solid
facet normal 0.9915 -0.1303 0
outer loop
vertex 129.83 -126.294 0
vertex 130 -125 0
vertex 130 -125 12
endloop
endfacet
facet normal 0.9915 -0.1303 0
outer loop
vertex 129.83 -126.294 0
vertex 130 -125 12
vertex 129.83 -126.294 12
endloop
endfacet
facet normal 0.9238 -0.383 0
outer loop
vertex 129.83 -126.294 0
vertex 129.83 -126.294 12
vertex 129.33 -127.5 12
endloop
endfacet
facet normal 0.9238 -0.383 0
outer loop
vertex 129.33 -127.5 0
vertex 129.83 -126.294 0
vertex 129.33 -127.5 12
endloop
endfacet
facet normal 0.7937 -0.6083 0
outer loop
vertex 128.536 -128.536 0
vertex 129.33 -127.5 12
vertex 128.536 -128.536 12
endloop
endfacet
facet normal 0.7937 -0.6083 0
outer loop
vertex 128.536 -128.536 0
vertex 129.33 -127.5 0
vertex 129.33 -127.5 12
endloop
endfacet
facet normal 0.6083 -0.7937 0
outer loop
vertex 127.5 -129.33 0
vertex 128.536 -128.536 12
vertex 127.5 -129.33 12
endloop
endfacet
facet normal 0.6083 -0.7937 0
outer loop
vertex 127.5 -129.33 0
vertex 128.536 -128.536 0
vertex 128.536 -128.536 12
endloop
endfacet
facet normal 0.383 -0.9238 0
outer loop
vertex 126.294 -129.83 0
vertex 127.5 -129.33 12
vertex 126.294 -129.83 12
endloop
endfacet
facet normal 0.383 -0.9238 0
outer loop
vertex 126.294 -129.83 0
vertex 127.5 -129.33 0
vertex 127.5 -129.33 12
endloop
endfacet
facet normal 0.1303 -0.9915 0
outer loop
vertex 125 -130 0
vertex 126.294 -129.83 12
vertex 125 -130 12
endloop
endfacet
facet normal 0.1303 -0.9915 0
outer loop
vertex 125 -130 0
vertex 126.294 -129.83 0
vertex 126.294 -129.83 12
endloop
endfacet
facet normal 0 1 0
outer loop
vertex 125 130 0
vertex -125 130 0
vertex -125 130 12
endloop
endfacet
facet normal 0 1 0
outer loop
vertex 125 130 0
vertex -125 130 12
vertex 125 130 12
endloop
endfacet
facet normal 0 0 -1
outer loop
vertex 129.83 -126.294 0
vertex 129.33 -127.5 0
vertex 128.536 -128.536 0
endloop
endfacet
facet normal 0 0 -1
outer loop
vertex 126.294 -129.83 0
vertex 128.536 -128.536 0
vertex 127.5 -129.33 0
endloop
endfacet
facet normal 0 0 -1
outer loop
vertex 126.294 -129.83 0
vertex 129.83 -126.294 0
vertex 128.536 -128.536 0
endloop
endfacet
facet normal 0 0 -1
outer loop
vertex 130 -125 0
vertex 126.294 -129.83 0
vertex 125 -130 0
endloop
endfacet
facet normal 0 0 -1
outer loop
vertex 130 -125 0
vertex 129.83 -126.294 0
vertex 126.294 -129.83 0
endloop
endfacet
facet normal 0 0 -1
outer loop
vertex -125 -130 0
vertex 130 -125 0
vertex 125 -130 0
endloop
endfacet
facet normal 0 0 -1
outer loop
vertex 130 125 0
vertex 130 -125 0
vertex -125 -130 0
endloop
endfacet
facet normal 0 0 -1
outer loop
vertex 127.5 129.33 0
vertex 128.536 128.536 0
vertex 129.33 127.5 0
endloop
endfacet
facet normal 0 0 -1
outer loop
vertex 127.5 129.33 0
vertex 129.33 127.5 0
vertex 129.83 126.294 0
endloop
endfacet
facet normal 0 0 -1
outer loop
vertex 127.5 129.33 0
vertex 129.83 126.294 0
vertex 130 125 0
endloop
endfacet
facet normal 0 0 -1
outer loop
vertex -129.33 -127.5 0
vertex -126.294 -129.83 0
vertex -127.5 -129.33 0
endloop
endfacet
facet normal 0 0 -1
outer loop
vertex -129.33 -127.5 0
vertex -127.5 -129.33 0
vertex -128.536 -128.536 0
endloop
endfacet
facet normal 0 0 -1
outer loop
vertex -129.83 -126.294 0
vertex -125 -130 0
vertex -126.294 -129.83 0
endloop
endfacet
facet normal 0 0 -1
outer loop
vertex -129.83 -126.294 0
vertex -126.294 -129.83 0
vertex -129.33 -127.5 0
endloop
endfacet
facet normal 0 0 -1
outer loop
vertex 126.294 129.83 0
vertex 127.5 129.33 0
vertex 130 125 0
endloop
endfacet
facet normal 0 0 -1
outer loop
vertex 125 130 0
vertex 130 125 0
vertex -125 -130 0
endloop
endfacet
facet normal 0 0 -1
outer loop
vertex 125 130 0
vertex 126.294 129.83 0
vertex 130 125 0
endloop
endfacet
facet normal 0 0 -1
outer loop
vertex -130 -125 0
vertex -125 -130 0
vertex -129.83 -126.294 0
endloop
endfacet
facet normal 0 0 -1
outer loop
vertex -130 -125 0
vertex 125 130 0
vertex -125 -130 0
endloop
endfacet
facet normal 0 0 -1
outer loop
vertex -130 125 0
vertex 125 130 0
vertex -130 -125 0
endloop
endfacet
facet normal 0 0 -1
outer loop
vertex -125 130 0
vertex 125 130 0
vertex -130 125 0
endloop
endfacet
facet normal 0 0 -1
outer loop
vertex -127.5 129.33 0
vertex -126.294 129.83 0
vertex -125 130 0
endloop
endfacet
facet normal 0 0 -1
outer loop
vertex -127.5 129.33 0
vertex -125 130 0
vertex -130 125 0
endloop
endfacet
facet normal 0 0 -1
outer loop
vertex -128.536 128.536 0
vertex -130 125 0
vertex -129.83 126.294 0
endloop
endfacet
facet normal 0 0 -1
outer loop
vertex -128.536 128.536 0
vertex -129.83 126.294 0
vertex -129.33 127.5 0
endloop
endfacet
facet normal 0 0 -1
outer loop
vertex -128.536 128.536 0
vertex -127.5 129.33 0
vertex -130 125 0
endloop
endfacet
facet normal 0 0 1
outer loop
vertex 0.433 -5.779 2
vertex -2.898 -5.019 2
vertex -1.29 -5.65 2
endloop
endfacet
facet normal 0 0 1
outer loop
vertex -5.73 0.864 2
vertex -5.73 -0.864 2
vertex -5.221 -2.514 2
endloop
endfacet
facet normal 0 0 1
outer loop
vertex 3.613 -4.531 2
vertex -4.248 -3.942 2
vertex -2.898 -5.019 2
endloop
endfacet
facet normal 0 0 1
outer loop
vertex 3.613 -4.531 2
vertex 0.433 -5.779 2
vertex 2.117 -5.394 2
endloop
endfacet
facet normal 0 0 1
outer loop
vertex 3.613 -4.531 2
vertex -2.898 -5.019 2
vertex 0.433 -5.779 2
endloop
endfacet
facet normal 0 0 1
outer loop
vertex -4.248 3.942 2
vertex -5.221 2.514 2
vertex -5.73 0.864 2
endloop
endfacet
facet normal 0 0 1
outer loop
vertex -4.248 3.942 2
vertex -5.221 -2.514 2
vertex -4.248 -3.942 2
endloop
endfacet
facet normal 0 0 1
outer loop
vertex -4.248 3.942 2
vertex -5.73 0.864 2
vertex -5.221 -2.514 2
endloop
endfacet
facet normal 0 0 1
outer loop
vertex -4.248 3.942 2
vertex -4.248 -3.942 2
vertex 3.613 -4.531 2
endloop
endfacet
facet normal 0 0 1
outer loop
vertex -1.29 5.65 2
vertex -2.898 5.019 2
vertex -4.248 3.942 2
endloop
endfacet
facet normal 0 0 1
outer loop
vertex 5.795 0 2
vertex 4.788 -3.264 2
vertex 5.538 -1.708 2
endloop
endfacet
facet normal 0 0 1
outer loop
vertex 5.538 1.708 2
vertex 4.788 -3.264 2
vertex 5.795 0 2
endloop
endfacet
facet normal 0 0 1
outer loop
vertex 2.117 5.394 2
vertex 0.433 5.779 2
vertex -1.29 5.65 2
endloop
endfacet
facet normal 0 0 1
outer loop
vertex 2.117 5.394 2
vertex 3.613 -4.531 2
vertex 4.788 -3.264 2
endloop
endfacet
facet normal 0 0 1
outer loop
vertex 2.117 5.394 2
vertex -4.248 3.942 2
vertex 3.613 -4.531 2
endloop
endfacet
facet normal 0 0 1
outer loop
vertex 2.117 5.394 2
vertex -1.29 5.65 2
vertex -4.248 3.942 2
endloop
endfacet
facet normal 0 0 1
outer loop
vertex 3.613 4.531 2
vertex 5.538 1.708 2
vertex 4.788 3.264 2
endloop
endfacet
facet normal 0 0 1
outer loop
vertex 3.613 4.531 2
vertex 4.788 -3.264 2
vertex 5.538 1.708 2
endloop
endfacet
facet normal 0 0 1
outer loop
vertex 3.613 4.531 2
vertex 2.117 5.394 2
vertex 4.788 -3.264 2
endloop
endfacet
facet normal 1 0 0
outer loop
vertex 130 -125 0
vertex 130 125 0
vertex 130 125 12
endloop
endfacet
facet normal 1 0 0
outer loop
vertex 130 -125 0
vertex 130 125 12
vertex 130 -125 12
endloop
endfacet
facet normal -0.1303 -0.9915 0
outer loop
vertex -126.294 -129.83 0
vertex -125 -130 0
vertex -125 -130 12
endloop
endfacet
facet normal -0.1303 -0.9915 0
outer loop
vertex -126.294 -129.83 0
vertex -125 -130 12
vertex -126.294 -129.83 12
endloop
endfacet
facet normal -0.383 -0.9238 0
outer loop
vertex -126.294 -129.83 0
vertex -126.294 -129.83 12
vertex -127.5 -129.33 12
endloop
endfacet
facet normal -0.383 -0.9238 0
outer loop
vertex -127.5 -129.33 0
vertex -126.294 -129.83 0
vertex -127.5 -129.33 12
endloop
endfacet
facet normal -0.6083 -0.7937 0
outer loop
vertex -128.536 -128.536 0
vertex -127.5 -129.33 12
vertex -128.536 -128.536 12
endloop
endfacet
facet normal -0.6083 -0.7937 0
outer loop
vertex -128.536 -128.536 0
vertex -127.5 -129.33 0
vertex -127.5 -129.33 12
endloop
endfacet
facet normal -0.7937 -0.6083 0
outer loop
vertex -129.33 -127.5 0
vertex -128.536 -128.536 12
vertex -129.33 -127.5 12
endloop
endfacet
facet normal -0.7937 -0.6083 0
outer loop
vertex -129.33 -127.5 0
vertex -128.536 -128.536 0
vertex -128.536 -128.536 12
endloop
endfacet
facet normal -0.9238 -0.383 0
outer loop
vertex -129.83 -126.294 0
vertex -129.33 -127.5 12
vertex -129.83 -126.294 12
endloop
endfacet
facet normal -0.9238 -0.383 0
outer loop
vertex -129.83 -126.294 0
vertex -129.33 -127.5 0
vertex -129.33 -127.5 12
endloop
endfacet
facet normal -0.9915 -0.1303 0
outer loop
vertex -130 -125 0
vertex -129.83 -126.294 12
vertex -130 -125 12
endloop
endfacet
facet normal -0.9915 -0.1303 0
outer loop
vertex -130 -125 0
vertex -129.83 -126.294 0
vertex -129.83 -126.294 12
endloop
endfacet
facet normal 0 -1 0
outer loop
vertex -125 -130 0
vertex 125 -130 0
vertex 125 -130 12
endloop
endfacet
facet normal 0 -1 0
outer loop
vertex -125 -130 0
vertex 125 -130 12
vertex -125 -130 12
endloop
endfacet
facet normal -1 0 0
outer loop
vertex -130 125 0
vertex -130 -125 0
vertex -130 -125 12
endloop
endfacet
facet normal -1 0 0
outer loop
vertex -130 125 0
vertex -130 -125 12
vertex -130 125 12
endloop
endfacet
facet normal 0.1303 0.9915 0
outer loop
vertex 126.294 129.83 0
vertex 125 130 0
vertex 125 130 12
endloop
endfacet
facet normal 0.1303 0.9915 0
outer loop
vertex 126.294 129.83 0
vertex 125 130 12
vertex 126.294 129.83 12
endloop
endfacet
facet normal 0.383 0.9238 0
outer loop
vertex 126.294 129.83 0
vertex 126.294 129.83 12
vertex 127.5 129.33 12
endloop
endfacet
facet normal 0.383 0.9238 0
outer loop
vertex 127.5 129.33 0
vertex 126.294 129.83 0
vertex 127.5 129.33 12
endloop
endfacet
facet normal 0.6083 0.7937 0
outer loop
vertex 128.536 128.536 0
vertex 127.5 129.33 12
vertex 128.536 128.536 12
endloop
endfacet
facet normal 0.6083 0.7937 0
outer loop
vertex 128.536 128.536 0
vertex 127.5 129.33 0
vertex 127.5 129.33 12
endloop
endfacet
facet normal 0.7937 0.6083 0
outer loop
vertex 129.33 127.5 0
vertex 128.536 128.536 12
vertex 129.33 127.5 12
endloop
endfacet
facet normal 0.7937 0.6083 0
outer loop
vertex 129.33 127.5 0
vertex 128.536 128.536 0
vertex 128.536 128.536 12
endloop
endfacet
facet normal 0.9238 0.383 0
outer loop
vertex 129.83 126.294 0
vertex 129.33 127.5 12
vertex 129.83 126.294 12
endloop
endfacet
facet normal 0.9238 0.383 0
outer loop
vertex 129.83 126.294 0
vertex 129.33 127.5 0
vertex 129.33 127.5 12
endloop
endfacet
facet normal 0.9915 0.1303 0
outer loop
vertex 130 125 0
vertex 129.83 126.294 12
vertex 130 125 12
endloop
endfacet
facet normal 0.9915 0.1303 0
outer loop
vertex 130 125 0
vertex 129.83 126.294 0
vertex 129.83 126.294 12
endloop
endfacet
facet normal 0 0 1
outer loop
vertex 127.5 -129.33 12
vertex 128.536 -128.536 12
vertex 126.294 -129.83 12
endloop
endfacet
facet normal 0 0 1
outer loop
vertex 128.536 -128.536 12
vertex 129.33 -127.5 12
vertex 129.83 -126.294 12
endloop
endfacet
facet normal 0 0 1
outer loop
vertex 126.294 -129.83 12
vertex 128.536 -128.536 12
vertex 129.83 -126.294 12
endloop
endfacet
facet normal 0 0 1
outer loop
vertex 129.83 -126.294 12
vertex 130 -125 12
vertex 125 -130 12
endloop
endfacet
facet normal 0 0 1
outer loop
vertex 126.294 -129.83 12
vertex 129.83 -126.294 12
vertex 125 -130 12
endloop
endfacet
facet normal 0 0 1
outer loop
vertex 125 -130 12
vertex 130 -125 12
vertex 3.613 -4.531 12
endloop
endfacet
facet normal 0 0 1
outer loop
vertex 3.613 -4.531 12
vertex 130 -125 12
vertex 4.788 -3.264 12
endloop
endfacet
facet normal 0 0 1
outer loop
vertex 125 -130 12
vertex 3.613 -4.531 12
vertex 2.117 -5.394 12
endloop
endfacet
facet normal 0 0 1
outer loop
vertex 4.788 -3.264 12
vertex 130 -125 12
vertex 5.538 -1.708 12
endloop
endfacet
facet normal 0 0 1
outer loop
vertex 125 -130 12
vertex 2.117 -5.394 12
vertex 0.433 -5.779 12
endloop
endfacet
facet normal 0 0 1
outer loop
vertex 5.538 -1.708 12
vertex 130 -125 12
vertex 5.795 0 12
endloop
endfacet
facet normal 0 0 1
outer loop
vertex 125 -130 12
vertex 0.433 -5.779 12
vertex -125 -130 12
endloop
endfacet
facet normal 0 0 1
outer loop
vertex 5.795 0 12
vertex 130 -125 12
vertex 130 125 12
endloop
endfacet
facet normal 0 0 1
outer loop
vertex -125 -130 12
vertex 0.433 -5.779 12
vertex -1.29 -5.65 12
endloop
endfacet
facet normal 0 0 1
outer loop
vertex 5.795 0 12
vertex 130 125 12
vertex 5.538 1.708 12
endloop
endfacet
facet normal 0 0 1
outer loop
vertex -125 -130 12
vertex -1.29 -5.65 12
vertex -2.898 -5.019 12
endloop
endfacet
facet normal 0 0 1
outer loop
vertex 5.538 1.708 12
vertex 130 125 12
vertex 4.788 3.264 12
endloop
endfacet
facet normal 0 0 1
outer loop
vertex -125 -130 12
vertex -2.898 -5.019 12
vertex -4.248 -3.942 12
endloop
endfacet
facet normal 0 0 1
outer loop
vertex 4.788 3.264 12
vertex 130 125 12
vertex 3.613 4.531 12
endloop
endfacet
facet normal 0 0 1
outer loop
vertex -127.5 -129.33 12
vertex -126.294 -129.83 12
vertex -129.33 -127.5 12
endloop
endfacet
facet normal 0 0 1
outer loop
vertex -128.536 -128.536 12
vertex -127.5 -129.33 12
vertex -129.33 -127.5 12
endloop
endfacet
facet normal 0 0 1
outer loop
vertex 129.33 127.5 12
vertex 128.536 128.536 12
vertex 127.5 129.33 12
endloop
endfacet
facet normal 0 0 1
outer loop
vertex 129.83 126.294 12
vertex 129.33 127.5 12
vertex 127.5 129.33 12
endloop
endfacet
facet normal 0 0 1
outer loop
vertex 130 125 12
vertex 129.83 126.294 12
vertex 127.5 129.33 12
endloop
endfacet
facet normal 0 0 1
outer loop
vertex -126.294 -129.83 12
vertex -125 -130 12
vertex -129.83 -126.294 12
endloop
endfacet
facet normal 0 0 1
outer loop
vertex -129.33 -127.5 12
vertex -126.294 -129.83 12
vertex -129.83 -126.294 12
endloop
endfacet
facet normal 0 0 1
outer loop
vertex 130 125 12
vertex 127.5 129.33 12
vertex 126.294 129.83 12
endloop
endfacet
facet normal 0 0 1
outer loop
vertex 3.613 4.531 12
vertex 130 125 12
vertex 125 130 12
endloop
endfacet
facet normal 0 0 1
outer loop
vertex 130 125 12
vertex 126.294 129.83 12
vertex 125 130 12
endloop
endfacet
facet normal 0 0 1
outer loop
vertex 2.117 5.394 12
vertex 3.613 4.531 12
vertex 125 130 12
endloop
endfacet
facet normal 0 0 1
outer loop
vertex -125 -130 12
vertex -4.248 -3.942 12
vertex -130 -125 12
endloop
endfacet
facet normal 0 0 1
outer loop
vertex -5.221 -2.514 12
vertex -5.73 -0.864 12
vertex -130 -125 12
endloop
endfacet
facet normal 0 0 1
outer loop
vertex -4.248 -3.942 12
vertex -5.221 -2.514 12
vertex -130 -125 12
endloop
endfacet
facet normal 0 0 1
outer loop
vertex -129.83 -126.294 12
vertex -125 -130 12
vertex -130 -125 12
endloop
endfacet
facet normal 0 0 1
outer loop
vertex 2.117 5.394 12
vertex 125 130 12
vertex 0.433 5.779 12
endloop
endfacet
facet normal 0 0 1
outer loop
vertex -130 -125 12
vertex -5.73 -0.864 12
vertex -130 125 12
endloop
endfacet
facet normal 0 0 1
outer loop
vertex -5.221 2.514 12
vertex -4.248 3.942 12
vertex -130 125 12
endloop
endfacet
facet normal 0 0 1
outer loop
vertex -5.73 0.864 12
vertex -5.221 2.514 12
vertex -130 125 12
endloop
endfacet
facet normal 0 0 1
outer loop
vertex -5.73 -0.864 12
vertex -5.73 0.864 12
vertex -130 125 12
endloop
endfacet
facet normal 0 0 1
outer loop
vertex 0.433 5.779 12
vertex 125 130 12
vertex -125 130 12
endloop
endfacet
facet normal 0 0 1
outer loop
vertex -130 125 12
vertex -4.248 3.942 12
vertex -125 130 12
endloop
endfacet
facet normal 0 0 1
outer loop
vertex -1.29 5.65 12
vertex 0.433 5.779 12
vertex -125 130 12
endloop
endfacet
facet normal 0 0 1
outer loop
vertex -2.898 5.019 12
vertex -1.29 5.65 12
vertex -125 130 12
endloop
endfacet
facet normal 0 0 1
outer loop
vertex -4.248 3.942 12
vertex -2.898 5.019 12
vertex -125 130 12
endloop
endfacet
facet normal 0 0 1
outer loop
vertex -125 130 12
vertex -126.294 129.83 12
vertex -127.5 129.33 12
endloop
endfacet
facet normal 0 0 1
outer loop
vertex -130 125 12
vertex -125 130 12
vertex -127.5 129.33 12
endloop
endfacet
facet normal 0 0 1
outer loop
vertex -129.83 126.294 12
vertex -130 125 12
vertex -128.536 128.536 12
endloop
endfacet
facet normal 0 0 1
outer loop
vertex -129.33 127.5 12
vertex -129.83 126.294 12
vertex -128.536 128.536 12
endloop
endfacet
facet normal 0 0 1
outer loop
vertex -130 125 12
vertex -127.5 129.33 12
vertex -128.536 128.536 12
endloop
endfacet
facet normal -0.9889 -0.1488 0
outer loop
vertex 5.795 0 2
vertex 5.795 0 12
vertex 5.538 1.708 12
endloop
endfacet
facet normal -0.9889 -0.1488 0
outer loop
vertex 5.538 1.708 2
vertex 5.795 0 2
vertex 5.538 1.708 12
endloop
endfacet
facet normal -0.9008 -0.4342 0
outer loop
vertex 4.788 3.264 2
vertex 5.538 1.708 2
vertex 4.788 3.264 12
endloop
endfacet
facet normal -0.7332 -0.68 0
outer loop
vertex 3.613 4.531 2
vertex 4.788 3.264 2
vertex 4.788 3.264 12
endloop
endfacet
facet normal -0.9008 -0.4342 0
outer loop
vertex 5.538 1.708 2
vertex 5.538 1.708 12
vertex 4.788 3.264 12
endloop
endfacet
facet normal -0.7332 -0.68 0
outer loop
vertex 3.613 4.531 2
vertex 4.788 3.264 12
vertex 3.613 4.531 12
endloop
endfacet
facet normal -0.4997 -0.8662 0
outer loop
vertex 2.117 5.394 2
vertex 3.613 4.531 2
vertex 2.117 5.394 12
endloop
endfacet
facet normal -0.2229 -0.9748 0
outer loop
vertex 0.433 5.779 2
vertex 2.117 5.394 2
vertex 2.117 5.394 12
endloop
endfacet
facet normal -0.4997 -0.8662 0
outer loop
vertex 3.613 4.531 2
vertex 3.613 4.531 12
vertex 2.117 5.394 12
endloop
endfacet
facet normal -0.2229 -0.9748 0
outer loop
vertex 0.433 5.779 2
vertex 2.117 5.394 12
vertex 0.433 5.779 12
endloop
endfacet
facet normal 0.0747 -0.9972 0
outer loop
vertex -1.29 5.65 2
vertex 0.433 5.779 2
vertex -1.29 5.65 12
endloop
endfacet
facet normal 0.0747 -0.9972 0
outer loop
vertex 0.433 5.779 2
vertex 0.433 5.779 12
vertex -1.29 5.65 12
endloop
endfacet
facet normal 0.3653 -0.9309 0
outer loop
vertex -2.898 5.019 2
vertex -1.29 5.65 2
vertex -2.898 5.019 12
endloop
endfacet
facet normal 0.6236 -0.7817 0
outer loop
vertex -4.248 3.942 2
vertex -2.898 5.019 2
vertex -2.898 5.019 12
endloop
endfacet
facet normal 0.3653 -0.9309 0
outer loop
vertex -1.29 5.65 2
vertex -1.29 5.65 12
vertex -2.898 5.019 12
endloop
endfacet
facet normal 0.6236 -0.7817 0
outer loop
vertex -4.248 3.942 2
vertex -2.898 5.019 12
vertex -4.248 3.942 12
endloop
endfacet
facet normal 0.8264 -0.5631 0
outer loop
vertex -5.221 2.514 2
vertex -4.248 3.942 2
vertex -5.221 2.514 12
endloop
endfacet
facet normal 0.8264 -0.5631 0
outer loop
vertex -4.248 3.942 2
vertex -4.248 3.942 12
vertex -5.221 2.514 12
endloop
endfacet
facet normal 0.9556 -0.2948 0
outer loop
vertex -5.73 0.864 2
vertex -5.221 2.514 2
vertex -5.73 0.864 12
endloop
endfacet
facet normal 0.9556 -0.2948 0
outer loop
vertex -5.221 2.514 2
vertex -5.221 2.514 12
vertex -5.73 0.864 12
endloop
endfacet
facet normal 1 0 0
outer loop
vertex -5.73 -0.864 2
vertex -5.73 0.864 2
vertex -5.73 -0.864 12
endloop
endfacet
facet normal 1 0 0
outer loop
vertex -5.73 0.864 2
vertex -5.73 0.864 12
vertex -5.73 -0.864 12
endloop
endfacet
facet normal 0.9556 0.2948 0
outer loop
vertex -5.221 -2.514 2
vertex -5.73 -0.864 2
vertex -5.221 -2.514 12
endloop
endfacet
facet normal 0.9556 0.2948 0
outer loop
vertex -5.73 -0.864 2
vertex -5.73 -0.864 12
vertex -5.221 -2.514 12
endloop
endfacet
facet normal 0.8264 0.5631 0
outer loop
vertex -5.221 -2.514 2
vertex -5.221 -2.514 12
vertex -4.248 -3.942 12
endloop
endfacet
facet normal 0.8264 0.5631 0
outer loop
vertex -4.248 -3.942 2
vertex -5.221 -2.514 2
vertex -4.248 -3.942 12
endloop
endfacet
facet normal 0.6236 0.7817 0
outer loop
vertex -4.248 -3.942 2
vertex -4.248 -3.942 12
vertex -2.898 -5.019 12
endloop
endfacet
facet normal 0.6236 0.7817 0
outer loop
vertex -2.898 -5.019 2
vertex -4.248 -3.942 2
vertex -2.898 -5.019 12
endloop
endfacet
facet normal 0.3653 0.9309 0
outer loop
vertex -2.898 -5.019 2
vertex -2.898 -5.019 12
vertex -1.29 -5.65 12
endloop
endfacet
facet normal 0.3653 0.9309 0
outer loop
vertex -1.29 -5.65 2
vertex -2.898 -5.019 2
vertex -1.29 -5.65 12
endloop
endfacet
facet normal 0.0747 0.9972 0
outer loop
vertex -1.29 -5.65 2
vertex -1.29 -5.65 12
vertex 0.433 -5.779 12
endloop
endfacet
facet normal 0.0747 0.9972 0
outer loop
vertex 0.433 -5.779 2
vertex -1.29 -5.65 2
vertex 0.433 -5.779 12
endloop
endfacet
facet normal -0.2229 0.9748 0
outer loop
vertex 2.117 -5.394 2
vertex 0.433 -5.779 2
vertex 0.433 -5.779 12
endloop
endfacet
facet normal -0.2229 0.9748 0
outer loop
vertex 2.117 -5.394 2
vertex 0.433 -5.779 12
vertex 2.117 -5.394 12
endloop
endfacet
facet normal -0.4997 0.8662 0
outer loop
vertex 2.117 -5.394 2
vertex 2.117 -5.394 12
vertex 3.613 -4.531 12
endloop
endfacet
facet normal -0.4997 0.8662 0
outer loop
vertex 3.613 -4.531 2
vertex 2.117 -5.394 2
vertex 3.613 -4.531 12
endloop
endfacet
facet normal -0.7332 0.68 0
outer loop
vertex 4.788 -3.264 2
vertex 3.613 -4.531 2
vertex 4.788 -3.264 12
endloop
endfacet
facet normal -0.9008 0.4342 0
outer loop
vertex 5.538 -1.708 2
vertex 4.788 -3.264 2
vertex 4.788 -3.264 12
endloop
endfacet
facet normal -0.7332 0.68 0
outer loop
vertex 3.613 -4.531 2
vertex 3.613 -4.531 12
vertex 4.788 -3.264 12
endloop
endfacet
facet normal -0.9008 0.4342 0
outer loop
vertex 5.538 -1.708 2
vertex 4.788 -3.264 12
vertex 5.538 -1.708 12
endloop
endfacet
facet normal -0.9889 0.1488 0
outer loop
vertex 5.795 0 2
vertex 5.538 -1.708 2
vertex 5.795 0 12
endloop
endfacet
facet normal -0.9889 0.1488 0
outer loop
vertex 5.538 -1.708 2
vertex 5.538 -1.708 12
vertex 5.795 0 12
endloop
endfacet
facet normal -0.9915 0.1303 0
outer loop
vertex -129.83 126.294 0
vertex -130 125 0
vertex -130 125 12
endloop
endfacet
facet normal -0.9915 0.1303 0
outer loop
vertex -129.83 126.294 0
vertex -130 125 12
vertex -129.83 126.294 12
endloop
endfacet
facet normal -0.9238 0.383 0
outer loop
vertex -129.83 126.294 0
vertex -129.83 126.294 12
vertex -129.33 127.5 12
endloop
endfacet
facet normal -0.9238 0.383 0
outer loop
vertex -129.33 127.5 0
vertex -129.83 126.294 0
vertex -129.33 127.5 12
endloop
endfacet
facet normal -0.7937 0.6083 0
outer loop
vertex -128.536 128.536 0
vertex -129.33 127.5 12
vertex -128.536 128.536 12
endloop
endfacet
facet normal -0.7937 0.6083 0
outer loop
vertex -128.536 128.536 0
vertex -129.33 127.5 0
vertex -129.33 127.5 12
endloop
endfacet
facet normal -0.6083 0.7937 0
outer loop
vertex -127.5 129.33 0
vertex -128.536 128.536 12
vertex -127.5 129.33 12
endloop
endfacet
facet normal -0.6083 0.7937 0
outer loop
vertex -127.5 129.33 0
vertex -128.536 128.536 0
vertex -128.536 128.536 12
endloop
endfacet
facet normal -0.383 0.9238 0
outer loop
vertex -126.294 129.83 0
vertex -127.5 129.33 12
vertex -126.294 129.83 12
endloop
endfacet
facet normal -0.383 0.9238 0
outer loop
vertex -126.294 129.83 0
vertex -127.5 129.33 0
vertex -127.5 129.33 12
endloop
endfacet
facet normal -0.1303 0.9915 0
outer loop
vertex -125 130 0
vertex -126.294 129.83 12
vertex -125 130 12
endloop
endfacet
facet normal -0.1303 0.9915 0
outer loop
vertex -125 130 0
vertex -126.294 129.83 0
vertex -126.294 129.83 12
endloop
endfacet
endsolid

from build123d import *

# Parameters (mm, degrees)
BOSS_EXTRUDE1_DEPTH = 12
SKETCH2_R           = 5.795
CUT_EXTRUDE1_DEPTH  = 10


with BuildPart() as part:
    # Sketch1 → Boss-Extrude1 (new body)
    with BuildSketch(Plane.XY):
        with BuildLine():
            Line((-125, 130), (125, 130))
            ThreePointArc((125, 130), (128.535533906, 128.535533906), (130, 125))
            Line((130, 125), (130, -125))
            ThreePointArc((130, -125), (128.535533906, -128.535533906), (125, -130))
            Line((125, -130), (-125, -130))
            ThreePointArc((-125, -130), (-128.535533906, -128.535533906), (-130, -125))
            Line((-130, -125), (-130, 125))
            ThreePointArc((-130, 125), (-128.535533906, 128.535533906), (-125, 130))
        make_face()
    extrude(amount=BOSS_EXTRUDE1_DEPTH)

    # Sketch2 → Cut-Extrude1 (cut)
    with BuildSketch(Plane.XY.offset(12)):
        Circle(SKETCH2_R)
    extrude(amount=-CUT_EXTRUDE1_DEPTH, mode=Mode.SUBTRACT)


solid = part.part
